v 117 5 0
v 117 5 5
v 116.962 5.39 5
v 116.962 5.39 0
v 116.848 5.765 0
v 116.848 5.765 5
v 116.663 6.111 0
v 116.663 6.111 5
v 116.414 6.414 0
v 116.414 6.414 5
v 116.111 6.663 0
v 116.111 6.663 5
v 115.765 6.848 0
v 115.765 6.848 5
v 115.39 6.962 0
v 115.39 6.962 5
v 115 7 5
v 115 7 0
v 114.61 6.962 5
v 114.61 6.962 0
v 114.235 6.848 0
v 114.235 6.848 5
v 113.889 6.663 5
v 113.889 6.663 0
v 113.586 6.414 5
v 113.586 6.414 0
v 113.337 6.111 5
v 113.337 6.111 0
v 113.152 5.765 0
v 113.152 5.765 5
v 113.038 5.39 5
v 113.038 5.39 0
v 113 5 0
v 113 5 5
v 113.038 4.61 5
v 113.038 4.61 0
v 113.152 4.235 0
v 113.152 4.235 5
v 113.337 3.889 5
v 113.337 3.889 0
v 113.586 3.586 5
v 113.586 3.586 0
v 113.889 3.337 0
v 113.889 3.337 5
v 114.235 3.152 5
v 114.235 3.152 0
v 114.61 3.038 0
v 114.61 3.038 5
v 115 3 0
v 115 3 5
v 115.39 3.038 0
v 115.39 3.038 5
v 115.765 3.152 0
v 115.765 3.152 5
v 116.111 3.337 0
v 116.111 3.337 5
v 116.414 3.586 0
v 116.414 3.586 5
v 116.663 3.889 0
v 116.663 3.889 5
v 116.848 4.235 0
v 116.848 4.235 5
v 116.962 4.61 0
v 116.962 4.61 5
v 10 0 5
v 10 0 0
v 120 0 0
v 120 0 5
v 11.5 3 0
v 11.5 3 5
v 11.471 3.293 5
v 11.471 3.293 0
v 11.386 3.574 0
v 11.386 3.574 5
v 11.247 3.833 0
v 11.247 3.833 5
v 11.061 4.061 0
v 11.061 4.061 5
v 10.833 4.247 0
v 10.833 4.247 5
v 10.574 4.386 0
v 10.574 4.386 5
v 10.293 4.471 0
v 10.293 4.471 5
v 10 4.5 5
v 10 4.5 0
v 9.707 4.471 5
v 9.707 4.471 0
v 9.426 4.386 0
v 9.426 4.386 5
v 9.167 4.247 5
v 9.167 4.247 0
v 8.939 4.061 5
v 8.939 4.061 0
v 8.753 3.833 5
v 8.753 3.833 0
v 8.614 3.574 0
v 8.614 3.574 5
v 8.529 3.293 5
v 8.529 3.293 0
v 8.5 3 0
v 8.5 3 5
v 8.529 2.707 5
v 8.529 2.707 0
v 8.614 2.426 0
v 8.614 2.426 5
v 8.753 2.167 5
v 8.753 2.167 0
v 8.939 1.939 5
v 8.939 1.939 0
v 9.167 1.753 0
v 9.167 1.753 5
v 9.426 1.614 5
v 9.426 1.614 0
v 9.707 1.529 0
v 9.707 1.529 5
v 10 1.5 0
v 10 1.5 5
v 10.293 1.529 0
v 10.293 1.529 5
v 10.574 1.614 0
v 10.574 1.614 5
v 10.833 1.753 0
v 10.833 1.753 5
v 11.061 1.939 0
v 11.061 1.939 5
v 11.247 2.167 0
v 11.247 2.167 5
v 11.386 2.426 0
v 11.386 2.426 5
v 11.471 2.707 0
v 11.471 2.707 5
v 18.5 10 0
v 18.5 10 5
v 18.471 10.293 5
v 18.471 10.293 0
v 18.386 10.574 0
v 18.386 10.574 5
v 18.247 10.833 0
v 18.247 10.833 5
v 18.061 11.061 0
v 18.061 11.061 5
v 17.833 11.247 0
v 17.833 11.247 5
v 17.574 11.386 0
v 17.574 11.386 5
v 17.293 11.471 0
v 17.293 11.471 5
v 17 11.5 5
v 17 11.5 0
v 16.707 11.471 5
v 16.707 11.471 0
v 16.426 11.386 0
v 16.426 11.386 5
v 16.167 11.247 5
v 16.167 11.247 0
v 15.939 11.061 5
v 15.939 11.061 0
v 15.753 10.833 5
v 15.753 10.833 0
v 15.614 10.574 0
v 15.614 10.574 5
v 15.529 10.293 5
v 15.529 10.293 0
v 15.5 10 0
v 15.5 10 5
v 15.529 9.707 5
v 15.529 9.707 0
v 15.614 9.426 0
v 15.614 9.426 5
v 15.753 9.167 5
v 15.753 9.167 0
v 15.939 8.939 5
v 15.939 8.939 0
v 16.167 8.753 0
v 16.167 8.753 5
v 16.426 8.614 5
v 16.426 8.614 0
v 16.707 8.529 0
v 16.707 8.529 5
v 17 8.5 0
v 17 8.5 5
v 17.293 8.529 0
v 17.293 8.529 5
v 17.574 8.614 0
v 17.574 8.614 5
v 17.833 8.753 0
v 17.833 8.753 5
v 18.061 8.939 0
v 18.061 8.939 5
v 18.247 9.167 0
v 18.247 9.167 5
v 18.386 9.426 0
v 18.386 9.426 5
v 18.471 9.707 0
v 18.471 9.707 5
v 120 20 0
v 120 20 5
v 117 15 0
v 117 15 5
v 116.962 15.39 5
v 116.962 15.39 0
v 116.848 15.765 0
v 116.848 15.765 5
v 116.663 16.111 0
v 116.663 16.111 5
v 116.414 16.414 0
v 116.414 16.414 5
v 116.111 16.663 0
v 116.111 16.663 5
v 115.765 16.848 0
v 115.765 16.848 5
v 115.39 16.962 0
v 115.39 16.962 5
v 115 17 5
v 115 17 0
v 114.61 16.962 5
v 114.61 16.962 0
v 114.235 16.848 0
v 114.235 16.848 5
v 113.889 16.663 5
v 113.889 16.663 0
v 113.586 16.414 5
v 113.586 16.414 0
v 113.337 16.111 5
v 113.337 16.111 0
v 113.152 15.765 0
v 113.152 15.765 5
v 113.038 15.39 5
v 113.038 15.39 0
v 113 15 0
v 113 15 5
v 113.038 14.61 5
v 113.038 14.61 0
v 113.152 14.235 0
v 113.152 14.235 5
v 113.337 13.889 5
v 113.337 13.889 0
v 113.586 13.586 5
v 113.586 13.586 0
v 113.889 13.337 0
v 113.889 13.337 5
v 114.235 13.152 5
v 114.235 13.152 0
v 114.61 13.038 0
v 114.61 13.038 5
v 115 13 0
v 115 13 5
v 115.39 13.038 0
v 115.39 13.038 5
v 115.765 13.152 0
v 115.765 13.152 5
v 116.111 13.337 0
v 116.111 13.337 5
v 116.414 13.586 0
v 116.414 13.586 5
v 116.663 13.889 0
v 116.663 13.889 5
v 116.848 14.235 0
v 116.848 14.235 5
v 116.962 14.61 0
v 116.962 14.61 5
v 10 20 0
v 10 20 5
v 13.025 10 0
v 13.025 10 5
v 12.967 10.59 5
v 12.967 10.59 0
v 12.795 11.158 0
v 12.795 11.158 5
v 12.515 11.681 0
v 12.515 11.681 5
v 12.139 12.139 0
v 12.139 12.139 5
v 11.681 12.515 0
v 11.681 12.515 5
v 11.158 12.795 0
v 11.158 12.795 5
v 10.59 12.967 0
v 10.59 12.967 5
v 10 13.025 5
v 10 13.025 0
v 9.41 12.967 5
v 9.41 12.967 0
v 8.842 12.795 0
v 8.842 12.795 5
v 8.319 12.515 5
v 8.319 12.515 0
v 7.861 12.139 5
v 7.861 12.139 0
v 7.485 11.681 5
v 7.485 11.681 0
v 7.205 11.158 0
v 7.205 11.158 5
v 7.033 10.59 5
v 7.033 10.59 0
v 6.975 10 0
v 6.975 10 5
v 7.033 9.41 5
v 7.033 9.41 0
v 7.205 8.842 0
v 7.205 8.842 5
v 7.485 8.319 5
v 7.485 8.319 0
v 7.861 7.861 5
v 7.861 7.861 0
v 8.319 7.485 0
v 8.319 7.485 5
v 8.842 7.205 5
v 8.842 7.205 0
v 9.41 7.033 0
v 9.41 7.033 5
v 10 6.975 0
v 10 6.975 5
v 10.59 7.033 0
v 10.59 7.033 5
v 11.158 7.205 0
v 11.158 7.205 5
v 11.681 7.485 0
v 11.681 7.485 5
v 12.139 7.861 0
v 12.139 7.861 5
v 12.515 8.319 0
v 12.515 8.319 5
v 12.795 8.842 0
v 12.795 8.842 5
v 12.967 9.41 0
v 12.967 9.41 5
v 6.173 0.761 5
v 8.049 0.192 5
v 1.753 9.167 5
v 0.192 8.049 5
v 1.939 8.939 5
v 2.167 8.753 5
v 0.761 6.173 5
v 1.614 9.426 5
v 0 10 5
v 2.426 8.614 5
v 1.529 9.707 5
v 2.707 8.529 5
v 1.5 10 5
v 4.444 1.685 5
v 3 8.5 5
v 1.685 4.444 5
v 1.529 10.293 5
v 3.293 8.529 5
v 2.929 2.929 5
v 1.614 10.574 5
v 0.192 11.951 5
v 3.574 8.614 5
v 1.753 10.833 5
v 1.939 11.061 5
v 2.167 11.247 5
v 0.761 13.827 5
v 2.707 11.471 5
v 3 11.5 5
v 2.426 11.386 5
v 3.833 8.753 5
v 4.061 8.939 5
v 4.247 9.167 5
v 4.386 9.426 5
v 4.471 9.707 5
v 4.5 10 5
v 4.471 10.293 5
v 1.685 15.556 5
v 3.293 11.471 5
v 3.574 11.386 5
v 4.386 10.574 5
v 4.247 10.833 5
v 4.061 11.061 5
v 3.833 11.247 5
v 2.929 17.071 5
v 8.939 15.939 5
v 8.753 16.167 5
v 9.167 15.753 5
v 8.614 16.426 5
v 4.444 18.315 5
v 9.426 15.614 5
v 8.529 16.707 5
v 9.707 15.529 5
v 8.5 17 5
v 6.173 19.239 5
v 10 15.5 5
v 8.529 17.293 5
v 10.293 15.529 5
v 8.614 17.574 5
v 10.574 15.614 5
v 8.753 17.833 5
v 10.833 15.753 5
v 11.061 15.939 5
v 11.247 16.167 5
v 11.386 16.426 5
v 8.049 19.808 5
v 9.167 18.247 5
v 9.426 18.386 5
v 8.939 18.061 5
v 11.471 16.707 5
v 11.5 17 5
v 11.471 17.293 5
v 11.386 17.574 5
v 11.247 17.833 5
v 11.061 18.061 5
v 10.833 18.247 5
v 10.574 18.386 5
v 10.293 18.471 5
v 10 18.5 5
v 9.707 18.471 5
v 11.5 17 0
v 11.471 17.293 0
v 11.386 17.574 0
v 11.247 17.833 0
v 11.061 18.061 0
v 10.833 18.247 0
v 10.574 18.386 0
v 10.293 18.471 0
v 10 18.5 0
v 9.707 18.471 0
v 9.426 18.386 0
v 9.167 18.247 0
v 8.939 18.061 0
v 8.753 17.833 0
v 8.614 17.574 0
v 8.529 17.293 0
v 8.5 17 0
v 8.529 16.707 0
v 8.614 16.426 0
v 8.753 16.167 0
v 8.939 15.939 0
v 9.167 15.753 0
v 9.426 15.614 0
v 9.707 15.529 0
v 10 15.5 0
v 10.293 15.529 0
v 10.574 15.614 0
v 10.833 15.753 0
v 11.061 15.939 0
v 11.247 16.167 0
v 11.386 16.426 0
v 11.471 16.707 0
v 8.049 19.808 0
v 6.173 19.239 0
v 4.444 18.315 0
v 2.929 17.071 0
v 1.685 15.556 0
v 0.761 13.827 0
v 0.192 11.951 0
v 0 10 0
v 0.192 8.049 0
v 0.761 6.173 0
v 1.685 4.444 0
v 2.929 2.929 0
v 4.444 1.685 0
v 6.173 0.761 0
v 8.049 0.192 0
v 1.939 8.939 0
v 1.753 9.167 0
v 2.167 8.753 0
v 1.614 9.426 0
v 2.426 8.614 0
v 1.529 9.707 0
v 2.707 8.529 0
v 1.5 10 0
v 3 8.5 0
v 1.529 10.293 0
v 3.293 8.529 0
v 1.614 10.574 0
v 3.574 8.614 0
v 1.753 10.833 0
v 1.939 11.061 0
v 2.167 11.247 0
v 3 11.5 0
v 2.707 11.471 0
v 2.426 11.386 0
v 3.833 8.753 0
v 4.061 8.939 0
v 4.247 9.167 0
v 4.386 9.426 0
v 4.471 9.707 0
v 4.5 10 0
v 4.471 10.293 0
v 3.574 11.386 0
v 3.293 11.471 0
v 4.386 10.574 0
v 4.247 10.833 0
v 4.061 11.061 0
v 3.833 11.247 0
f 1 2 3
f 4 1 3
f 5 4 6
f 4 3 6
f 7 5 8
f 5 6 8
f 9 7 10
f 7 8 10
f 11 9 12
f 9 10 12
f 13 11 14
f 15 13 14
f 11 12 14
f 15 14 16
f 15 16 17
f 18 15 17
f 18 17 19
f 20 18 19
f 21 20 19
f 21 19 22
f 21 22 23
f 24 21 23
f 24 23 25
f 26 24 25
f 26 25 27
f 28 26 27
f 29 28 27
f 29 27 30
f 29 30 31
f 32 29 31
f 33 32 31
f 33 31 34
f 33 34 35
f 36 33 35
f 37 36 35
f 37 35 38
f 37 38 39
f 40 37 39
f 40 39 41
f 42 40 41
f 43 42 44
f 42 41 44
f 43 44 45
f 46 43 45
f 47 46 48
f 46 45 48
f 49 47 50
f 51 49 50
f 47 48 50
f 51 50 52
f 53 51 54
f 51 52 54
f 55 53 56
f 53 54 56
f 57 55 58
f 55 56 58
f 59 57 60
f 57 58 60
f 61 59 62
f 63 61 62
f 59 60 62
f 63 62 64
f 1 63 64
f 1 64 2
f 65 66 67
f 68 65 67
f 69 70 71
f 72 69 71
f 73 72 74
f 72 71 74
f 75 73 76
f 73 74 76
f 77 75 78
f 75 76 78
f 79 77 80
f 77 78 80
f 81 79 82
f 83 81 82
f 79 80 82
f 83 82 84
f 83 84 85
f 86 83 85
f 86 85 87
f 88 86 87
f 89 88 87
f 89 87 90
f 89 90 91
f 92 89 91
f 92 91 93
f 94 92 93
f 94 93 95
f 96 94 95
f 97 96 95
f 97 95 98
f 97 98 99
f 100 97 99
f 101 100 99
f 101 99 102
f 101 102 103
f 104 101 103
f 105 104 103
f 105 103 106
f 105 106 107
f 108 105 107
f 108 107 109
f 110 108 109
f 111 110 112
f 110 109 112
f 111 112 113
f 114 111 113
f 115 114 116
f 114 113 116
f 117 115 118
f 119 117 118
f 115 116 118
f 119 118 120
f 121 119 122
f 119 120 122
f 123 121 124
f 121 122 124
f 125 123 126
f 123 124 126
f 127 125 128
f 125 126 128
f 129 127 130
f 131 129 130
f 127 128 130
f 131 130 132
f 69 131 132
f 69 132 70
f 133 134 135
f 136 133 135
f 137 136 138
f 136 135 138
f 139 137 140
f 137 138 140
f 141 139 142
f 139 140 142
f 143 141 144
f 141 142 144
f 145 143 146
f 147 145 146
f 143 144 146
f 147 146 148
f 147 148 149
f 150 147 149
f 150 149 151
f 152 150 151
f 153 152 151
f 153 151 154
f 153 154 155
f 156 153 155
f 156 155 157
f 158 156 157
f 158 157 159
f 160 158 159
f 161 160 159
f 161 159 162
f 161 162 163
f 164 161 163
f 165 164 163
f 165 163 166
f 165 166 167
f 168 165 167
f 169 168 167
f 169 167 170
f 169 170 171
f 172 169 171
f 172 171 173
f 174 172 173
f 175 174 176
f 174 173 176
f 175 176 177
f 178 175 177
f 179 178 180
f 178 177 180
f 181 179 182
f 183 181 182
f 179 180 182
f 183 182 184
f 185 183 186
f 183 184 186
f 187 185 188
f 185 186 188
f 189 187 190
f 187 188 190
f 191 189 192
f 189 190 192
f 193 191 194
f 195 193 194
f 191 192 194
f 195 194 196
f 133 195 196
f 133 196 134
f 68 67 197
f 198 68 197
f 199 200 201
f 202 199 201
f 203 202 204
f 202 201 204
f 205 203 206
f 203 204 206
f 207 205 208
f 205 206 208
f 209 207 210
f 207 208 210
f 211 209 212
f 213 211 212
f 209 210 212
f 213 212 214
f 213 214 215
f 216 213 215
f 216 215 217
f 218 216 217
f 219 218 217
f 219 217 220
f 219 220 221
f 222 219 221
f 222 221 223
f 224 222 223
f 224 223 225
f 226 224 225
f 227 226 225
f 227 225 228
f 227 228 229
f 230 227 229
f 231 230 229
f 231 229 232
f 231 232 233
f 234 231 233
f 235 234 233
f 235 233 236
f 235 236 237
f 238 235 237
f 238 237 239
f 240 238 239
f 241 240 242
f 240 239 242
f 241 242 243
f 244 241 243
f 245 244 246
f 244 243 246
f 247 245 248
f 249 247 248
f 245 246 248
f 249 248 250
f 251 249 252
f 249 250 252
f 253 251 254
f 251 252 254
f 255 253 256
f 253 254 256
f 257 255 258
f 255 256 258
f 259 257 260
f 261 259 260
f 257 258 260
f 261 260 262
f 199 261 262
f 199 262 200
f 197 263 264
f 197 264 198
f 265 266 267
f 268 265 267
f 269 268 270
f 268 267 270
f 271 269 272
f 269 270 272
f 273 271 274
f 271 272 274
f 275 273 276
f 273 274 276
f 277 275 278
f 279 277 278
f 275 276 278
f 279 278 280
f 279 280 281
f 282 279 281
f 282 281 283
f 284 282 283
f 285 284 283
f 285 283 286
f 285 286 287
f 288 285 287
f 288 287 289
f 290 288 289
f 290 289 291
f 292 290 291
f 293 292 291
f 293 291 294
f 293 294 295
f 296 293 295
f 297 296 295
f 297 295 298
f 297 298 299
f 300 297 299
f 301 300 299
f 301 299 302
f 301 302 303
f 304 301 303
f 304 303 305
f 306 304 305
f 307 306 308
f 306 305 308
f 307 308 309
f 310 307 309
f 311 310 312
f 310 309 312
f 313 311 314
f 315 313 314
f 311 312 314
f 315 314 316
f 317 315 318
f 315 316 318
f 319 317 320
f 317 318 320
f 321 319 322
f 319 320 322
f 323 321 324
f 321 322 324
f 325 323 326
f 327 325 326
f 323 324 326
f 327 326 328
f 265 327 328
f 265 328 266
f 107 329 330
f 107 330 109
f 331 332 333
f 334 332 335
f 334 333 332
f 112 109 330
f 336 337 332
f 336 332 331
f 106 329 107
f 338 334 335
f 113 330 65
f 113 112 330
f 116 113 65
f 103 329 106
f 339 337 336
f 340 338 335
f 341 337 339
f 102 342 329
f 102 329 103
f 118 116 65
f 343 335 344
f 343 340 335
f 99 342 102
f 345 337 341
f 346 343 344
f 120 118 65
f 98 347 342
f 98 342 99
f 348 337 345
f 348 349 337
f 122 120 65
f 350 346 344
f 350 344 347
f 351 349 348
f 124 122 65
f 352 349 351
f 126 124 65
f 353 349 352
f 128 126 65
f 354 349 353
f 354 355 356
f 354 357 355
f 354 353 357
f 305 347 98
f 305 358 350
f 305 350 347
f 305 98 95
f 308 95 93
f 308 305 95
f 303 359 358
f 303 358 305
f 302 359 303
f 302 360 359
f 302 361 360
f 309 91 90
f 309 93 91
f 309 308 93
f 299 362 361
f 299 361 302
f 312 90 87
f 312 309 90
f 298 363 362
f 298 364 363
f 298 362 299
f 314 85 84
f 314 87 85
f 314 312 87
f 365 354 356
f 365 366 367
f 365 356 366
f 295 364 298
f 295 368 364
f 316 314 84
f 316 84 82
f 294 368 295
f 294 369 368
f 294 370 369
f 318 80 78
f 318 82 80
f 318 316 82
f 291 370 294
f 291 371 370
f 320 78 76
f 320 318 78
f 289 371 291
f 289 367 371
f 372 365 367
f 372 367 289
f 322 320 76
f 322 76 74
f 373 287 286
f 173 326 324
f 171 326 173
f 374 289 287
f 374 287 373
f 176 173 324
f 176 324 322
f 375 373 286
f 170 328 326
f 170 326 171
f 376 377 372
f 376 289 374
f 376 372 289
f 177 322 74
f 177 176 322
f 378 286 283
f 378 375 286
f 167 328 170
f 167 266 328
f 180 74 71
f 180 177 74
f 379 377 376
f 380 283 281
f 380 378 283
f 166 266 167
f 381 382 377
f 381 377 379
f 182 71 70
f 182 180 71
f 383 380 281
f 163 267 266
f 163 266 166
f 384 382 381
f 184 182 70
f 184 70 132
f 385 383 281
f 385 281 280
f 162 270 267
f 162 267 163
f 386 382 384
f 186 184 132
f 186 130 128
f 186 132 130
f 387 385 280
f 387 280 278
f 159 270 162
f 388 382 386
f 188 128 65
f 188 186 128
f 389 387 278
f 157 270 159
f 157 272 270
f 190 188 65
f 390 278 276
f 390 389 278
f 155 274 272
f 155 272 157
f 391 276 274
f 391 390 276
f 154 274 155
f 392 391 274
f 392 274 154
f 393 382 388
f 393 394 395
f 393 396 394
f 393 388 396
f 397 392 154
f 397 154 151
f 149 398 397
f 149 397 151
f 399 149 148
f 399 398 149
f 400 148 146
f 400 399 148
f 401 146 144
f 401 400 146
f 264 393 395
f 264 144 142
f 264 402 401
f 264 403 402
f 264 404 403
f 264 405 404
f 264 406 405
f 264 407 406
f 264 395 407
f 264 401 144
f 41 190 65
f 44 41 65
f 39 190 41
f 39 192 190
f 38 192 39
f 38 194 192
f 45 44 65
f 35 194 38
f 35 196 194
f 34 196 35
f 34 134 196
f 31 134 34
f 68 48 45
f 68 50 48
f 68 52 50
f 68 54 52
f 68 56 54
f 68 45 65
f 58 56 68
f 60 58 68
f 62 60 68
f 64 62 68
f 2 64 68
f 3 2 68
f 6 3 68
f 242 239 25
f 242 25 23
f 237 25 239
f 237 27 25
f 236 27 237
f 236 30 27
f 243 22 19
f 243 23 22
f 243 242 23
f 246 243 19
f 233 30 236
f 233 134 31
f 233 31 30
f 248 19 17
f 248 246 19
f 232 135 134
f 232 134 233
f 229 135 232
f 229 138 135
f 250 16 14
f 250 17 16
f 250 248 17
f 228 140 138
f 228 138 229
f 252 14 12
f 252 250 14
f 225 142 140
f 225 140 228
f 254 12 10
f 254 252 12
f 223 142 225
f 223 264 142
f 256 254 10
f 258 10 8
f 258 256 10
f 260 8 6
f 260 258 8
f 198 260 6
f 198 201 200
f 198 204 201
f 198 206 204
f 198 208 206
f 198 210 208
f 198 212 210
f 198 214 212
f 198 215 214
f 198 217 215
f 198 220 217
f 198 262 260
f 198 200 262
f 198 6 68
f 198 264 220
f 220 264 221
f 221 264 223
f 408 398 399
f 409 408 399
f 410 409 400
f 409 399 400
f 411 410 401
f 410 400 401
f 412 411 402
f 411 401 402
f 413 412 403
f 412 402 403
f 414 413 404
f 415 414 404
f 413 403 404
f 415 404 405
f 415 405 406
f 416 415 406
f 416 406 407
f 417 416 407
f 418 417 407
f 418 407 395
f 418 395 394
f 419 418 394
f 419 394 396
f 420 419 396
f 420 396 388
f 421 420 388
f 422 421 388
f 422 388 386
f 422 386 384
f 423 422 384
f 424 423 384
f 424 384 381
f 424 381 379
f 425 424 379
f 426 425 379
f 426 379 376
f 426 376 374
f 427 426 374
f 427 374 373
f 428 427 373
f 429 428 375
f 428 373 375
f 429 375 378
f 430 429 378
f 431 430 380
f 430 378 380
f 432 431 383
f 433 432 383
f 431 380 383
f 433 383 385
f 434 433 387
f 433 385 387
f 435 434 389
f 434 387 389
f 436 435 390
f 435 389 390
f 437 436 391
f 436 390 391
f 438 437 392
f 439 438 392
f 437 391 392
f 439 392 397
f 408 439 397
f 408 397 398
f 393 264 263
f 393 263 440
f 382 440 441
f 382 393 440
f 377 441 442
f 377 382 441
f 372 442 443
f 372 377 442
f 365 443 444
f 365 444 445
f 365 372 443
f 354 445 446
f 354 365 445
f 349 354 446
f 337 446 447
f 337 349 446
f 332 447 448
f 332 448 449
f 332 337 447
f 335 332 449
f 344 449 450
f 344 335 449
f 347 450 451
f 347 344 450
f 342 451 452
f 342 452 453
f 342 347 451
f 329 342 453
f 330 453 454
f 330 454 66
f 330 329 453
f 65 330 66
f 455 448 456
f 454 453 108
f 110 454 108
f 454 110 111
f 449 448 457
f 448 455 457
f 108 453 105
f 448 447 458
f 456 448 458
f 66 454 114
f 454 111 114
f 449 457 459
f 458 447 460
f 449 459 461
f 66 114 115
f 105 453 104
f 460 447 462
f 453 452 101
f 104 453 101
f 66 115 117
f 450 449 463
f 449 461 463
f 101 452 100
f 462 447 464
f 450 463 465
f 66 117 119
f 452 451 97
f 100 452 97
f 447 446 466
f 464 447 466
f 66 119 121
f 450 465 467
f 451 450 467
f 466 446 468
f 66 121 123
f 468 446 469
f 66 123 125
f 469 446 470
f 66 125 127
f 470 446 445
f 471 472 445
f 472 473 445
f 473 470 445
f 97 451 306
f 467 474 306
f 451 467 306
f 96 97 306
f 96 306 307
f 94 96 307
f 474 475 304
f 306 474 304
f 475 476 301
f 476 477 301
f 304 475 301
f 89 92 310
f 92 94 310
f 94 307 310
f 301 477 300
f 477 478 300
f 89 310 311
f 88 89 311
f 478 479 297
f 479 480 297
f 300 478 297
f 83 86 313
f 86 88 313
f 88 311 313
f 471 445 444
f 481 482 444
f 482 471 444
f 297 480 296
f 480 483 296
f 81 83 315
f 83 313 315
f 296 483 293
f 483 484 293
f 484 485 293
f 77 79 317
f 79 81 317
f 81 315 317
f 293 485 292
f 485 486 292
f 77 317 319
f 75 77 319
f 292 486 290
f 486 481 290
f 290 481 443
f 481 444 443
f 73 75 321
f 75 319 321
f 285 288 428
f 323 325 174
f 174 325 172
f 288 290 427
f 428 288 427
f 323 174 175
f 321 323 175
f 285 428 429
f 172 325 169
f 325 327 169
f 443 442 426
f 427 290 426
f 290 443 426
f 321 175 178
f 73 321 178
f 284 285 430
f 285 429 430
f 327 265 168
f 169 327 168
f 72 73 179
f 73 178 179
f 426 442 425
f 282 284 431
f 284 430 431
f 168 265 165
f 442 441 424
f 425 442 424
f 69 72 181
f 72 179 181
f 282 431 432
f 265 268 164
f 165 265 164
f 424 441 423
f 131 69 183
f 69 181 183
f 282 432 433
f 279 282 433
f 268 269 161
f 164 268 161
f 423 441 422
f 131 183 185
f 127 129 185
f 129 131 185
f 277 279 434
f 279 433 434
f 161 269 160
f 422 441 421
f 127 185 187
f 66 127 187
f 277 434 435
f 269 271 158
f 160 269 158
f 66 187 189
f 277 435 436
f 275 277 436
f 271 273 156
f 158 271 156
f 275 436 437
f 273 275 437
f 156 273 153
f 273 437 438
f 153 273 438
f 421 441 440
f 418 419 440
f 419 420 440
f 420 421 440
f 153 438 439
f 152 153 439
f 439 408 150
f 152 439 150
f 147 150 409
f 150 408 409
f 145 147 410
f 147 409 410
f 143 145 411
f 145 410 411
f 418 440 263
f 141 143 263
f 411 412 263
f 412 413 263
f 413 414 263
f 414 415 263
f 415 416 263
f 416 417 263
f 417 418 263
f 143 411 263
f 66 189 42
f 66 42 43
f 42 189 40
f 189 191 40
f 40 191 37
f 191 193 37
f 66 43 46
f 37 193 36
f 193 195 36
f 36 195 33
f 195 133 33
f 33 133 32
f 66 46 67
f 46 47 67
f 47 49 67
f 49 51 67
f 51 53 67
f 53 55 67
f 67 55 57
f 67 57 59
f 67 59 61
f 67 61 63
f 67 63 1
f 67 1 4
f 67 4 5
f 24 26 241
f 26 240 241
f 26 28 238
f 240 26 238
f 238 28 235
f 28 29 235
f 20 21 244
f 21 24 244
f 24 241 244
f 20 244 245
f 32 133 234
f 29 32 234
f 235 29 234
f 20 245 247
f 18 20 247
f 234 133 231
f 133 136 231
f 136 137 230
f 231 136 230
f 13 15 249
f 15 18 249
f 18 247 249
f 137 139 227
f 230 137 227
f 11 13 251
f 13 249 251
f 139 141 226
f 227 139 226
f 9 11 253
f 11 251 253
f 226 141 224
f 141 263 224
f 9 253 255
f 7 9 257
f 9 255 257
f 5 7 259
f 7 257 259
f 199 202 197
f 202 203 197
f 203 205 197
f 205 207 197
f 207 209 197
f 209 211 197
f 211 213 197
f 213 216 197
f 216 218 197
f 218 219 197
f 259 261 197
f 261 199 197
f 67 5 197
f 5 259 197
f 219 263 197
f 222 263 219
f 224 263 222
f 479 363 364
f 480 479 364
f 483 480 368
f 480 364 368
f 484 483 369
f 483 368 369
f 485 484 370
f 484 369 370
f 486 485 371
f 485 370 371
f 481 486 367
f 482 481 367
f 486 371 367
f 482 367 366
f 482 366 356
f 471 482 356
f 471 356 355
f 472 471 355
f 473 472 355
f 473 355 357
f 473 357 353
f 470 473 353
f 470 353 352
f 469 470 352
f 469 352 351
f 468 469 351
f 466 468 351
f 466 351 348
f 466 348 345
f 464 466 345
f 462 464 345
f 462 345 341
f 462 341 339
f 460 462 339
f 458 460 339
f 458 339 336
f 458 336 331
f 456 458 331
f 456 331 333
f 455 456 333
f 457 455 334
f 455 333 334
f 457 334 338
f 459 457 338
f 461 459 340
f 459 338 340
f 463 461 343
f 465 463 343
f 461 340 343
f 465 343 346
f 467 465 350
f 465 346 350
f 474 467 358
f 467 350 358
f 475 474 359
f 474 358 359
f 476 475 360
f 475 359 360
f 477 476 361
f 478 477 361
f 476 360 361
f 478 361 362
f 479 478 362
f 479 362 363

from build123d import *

# Parameters (mm, degrees)
SKETCH1_W           = 120
SKETCH1_H           = 20
BOSS_EXTRUDE1_DEPTH = 5
SKETCH2_R           = 1.5
SKETCH2_R_2         = 3.025
CUT_EXTRUDE1_DEPTH  = 10
CUT_EXTRUDE2_DEPTH  = 10
SKETCH5_R           = 2
CUT_EXTRUDE3_DEPTH  = 10


with BuildPart() as part:
    # Sketch1 → Boss-Extrude1 (new body)
    with BuildSketch(Plane.XY):
        with Locations((60, 10)):
            Rectangle(SKETCH1_W, SKETCH1_H)
    extrude(amount=BOSS_EXTRUDE1_DEPTH)

    # Sketch2 → Cut-Extrude1 (cut)
    with BuildSketch(Plane.XY.offset(5)):
        with Locations((10, 17)):
            Circle(SKETCH2_R)
        with Locations((17, 10)):
            Circle(SKETCH2_R)
        with Locations((10, 10)):
            Circle(SKETCH2_R_2)
        with Locations((10, 3)):
            Circle(SKETCH2_R)
        with Locations((3, 10)):
            Circle(SKETCH2_R)
    extrude(amount=-CUT_EXTRUDE1_DEPTH, mode=Mode.SUBTRACT)

    # Sketch3 → Cut-Extrude2 (cut)
    with BuildSketch(Plane.XY.offset(5)):
        with BuildLine():
            Line((10, 30), (10, 20))
            ThreePointArc((10, 20), (0, 10), (10, 0))
            Line((10, 0), (10, -10))
            ThreePointArc((10, -10), (-10, 10), (10, 30))
        make_face()
    extrude(amount=-CUT_EXTRUDE2_DEPTH, mode=Mode.SUBTRACT)

    # Sketch5 → Cut-Extrude3 (cut)
    with BuildSketch(Plane.XY.offset(5)):
        with Locations((115, 15)):
            Circle(SKETCH5_R)
        with Locations((115, 5)):
            Circle(SKETCH5_R)
    extrude(amount=-CUT_EXTRUDE3_DEPTH, mode=Mode.SUBTRACT)


solid = part.part
